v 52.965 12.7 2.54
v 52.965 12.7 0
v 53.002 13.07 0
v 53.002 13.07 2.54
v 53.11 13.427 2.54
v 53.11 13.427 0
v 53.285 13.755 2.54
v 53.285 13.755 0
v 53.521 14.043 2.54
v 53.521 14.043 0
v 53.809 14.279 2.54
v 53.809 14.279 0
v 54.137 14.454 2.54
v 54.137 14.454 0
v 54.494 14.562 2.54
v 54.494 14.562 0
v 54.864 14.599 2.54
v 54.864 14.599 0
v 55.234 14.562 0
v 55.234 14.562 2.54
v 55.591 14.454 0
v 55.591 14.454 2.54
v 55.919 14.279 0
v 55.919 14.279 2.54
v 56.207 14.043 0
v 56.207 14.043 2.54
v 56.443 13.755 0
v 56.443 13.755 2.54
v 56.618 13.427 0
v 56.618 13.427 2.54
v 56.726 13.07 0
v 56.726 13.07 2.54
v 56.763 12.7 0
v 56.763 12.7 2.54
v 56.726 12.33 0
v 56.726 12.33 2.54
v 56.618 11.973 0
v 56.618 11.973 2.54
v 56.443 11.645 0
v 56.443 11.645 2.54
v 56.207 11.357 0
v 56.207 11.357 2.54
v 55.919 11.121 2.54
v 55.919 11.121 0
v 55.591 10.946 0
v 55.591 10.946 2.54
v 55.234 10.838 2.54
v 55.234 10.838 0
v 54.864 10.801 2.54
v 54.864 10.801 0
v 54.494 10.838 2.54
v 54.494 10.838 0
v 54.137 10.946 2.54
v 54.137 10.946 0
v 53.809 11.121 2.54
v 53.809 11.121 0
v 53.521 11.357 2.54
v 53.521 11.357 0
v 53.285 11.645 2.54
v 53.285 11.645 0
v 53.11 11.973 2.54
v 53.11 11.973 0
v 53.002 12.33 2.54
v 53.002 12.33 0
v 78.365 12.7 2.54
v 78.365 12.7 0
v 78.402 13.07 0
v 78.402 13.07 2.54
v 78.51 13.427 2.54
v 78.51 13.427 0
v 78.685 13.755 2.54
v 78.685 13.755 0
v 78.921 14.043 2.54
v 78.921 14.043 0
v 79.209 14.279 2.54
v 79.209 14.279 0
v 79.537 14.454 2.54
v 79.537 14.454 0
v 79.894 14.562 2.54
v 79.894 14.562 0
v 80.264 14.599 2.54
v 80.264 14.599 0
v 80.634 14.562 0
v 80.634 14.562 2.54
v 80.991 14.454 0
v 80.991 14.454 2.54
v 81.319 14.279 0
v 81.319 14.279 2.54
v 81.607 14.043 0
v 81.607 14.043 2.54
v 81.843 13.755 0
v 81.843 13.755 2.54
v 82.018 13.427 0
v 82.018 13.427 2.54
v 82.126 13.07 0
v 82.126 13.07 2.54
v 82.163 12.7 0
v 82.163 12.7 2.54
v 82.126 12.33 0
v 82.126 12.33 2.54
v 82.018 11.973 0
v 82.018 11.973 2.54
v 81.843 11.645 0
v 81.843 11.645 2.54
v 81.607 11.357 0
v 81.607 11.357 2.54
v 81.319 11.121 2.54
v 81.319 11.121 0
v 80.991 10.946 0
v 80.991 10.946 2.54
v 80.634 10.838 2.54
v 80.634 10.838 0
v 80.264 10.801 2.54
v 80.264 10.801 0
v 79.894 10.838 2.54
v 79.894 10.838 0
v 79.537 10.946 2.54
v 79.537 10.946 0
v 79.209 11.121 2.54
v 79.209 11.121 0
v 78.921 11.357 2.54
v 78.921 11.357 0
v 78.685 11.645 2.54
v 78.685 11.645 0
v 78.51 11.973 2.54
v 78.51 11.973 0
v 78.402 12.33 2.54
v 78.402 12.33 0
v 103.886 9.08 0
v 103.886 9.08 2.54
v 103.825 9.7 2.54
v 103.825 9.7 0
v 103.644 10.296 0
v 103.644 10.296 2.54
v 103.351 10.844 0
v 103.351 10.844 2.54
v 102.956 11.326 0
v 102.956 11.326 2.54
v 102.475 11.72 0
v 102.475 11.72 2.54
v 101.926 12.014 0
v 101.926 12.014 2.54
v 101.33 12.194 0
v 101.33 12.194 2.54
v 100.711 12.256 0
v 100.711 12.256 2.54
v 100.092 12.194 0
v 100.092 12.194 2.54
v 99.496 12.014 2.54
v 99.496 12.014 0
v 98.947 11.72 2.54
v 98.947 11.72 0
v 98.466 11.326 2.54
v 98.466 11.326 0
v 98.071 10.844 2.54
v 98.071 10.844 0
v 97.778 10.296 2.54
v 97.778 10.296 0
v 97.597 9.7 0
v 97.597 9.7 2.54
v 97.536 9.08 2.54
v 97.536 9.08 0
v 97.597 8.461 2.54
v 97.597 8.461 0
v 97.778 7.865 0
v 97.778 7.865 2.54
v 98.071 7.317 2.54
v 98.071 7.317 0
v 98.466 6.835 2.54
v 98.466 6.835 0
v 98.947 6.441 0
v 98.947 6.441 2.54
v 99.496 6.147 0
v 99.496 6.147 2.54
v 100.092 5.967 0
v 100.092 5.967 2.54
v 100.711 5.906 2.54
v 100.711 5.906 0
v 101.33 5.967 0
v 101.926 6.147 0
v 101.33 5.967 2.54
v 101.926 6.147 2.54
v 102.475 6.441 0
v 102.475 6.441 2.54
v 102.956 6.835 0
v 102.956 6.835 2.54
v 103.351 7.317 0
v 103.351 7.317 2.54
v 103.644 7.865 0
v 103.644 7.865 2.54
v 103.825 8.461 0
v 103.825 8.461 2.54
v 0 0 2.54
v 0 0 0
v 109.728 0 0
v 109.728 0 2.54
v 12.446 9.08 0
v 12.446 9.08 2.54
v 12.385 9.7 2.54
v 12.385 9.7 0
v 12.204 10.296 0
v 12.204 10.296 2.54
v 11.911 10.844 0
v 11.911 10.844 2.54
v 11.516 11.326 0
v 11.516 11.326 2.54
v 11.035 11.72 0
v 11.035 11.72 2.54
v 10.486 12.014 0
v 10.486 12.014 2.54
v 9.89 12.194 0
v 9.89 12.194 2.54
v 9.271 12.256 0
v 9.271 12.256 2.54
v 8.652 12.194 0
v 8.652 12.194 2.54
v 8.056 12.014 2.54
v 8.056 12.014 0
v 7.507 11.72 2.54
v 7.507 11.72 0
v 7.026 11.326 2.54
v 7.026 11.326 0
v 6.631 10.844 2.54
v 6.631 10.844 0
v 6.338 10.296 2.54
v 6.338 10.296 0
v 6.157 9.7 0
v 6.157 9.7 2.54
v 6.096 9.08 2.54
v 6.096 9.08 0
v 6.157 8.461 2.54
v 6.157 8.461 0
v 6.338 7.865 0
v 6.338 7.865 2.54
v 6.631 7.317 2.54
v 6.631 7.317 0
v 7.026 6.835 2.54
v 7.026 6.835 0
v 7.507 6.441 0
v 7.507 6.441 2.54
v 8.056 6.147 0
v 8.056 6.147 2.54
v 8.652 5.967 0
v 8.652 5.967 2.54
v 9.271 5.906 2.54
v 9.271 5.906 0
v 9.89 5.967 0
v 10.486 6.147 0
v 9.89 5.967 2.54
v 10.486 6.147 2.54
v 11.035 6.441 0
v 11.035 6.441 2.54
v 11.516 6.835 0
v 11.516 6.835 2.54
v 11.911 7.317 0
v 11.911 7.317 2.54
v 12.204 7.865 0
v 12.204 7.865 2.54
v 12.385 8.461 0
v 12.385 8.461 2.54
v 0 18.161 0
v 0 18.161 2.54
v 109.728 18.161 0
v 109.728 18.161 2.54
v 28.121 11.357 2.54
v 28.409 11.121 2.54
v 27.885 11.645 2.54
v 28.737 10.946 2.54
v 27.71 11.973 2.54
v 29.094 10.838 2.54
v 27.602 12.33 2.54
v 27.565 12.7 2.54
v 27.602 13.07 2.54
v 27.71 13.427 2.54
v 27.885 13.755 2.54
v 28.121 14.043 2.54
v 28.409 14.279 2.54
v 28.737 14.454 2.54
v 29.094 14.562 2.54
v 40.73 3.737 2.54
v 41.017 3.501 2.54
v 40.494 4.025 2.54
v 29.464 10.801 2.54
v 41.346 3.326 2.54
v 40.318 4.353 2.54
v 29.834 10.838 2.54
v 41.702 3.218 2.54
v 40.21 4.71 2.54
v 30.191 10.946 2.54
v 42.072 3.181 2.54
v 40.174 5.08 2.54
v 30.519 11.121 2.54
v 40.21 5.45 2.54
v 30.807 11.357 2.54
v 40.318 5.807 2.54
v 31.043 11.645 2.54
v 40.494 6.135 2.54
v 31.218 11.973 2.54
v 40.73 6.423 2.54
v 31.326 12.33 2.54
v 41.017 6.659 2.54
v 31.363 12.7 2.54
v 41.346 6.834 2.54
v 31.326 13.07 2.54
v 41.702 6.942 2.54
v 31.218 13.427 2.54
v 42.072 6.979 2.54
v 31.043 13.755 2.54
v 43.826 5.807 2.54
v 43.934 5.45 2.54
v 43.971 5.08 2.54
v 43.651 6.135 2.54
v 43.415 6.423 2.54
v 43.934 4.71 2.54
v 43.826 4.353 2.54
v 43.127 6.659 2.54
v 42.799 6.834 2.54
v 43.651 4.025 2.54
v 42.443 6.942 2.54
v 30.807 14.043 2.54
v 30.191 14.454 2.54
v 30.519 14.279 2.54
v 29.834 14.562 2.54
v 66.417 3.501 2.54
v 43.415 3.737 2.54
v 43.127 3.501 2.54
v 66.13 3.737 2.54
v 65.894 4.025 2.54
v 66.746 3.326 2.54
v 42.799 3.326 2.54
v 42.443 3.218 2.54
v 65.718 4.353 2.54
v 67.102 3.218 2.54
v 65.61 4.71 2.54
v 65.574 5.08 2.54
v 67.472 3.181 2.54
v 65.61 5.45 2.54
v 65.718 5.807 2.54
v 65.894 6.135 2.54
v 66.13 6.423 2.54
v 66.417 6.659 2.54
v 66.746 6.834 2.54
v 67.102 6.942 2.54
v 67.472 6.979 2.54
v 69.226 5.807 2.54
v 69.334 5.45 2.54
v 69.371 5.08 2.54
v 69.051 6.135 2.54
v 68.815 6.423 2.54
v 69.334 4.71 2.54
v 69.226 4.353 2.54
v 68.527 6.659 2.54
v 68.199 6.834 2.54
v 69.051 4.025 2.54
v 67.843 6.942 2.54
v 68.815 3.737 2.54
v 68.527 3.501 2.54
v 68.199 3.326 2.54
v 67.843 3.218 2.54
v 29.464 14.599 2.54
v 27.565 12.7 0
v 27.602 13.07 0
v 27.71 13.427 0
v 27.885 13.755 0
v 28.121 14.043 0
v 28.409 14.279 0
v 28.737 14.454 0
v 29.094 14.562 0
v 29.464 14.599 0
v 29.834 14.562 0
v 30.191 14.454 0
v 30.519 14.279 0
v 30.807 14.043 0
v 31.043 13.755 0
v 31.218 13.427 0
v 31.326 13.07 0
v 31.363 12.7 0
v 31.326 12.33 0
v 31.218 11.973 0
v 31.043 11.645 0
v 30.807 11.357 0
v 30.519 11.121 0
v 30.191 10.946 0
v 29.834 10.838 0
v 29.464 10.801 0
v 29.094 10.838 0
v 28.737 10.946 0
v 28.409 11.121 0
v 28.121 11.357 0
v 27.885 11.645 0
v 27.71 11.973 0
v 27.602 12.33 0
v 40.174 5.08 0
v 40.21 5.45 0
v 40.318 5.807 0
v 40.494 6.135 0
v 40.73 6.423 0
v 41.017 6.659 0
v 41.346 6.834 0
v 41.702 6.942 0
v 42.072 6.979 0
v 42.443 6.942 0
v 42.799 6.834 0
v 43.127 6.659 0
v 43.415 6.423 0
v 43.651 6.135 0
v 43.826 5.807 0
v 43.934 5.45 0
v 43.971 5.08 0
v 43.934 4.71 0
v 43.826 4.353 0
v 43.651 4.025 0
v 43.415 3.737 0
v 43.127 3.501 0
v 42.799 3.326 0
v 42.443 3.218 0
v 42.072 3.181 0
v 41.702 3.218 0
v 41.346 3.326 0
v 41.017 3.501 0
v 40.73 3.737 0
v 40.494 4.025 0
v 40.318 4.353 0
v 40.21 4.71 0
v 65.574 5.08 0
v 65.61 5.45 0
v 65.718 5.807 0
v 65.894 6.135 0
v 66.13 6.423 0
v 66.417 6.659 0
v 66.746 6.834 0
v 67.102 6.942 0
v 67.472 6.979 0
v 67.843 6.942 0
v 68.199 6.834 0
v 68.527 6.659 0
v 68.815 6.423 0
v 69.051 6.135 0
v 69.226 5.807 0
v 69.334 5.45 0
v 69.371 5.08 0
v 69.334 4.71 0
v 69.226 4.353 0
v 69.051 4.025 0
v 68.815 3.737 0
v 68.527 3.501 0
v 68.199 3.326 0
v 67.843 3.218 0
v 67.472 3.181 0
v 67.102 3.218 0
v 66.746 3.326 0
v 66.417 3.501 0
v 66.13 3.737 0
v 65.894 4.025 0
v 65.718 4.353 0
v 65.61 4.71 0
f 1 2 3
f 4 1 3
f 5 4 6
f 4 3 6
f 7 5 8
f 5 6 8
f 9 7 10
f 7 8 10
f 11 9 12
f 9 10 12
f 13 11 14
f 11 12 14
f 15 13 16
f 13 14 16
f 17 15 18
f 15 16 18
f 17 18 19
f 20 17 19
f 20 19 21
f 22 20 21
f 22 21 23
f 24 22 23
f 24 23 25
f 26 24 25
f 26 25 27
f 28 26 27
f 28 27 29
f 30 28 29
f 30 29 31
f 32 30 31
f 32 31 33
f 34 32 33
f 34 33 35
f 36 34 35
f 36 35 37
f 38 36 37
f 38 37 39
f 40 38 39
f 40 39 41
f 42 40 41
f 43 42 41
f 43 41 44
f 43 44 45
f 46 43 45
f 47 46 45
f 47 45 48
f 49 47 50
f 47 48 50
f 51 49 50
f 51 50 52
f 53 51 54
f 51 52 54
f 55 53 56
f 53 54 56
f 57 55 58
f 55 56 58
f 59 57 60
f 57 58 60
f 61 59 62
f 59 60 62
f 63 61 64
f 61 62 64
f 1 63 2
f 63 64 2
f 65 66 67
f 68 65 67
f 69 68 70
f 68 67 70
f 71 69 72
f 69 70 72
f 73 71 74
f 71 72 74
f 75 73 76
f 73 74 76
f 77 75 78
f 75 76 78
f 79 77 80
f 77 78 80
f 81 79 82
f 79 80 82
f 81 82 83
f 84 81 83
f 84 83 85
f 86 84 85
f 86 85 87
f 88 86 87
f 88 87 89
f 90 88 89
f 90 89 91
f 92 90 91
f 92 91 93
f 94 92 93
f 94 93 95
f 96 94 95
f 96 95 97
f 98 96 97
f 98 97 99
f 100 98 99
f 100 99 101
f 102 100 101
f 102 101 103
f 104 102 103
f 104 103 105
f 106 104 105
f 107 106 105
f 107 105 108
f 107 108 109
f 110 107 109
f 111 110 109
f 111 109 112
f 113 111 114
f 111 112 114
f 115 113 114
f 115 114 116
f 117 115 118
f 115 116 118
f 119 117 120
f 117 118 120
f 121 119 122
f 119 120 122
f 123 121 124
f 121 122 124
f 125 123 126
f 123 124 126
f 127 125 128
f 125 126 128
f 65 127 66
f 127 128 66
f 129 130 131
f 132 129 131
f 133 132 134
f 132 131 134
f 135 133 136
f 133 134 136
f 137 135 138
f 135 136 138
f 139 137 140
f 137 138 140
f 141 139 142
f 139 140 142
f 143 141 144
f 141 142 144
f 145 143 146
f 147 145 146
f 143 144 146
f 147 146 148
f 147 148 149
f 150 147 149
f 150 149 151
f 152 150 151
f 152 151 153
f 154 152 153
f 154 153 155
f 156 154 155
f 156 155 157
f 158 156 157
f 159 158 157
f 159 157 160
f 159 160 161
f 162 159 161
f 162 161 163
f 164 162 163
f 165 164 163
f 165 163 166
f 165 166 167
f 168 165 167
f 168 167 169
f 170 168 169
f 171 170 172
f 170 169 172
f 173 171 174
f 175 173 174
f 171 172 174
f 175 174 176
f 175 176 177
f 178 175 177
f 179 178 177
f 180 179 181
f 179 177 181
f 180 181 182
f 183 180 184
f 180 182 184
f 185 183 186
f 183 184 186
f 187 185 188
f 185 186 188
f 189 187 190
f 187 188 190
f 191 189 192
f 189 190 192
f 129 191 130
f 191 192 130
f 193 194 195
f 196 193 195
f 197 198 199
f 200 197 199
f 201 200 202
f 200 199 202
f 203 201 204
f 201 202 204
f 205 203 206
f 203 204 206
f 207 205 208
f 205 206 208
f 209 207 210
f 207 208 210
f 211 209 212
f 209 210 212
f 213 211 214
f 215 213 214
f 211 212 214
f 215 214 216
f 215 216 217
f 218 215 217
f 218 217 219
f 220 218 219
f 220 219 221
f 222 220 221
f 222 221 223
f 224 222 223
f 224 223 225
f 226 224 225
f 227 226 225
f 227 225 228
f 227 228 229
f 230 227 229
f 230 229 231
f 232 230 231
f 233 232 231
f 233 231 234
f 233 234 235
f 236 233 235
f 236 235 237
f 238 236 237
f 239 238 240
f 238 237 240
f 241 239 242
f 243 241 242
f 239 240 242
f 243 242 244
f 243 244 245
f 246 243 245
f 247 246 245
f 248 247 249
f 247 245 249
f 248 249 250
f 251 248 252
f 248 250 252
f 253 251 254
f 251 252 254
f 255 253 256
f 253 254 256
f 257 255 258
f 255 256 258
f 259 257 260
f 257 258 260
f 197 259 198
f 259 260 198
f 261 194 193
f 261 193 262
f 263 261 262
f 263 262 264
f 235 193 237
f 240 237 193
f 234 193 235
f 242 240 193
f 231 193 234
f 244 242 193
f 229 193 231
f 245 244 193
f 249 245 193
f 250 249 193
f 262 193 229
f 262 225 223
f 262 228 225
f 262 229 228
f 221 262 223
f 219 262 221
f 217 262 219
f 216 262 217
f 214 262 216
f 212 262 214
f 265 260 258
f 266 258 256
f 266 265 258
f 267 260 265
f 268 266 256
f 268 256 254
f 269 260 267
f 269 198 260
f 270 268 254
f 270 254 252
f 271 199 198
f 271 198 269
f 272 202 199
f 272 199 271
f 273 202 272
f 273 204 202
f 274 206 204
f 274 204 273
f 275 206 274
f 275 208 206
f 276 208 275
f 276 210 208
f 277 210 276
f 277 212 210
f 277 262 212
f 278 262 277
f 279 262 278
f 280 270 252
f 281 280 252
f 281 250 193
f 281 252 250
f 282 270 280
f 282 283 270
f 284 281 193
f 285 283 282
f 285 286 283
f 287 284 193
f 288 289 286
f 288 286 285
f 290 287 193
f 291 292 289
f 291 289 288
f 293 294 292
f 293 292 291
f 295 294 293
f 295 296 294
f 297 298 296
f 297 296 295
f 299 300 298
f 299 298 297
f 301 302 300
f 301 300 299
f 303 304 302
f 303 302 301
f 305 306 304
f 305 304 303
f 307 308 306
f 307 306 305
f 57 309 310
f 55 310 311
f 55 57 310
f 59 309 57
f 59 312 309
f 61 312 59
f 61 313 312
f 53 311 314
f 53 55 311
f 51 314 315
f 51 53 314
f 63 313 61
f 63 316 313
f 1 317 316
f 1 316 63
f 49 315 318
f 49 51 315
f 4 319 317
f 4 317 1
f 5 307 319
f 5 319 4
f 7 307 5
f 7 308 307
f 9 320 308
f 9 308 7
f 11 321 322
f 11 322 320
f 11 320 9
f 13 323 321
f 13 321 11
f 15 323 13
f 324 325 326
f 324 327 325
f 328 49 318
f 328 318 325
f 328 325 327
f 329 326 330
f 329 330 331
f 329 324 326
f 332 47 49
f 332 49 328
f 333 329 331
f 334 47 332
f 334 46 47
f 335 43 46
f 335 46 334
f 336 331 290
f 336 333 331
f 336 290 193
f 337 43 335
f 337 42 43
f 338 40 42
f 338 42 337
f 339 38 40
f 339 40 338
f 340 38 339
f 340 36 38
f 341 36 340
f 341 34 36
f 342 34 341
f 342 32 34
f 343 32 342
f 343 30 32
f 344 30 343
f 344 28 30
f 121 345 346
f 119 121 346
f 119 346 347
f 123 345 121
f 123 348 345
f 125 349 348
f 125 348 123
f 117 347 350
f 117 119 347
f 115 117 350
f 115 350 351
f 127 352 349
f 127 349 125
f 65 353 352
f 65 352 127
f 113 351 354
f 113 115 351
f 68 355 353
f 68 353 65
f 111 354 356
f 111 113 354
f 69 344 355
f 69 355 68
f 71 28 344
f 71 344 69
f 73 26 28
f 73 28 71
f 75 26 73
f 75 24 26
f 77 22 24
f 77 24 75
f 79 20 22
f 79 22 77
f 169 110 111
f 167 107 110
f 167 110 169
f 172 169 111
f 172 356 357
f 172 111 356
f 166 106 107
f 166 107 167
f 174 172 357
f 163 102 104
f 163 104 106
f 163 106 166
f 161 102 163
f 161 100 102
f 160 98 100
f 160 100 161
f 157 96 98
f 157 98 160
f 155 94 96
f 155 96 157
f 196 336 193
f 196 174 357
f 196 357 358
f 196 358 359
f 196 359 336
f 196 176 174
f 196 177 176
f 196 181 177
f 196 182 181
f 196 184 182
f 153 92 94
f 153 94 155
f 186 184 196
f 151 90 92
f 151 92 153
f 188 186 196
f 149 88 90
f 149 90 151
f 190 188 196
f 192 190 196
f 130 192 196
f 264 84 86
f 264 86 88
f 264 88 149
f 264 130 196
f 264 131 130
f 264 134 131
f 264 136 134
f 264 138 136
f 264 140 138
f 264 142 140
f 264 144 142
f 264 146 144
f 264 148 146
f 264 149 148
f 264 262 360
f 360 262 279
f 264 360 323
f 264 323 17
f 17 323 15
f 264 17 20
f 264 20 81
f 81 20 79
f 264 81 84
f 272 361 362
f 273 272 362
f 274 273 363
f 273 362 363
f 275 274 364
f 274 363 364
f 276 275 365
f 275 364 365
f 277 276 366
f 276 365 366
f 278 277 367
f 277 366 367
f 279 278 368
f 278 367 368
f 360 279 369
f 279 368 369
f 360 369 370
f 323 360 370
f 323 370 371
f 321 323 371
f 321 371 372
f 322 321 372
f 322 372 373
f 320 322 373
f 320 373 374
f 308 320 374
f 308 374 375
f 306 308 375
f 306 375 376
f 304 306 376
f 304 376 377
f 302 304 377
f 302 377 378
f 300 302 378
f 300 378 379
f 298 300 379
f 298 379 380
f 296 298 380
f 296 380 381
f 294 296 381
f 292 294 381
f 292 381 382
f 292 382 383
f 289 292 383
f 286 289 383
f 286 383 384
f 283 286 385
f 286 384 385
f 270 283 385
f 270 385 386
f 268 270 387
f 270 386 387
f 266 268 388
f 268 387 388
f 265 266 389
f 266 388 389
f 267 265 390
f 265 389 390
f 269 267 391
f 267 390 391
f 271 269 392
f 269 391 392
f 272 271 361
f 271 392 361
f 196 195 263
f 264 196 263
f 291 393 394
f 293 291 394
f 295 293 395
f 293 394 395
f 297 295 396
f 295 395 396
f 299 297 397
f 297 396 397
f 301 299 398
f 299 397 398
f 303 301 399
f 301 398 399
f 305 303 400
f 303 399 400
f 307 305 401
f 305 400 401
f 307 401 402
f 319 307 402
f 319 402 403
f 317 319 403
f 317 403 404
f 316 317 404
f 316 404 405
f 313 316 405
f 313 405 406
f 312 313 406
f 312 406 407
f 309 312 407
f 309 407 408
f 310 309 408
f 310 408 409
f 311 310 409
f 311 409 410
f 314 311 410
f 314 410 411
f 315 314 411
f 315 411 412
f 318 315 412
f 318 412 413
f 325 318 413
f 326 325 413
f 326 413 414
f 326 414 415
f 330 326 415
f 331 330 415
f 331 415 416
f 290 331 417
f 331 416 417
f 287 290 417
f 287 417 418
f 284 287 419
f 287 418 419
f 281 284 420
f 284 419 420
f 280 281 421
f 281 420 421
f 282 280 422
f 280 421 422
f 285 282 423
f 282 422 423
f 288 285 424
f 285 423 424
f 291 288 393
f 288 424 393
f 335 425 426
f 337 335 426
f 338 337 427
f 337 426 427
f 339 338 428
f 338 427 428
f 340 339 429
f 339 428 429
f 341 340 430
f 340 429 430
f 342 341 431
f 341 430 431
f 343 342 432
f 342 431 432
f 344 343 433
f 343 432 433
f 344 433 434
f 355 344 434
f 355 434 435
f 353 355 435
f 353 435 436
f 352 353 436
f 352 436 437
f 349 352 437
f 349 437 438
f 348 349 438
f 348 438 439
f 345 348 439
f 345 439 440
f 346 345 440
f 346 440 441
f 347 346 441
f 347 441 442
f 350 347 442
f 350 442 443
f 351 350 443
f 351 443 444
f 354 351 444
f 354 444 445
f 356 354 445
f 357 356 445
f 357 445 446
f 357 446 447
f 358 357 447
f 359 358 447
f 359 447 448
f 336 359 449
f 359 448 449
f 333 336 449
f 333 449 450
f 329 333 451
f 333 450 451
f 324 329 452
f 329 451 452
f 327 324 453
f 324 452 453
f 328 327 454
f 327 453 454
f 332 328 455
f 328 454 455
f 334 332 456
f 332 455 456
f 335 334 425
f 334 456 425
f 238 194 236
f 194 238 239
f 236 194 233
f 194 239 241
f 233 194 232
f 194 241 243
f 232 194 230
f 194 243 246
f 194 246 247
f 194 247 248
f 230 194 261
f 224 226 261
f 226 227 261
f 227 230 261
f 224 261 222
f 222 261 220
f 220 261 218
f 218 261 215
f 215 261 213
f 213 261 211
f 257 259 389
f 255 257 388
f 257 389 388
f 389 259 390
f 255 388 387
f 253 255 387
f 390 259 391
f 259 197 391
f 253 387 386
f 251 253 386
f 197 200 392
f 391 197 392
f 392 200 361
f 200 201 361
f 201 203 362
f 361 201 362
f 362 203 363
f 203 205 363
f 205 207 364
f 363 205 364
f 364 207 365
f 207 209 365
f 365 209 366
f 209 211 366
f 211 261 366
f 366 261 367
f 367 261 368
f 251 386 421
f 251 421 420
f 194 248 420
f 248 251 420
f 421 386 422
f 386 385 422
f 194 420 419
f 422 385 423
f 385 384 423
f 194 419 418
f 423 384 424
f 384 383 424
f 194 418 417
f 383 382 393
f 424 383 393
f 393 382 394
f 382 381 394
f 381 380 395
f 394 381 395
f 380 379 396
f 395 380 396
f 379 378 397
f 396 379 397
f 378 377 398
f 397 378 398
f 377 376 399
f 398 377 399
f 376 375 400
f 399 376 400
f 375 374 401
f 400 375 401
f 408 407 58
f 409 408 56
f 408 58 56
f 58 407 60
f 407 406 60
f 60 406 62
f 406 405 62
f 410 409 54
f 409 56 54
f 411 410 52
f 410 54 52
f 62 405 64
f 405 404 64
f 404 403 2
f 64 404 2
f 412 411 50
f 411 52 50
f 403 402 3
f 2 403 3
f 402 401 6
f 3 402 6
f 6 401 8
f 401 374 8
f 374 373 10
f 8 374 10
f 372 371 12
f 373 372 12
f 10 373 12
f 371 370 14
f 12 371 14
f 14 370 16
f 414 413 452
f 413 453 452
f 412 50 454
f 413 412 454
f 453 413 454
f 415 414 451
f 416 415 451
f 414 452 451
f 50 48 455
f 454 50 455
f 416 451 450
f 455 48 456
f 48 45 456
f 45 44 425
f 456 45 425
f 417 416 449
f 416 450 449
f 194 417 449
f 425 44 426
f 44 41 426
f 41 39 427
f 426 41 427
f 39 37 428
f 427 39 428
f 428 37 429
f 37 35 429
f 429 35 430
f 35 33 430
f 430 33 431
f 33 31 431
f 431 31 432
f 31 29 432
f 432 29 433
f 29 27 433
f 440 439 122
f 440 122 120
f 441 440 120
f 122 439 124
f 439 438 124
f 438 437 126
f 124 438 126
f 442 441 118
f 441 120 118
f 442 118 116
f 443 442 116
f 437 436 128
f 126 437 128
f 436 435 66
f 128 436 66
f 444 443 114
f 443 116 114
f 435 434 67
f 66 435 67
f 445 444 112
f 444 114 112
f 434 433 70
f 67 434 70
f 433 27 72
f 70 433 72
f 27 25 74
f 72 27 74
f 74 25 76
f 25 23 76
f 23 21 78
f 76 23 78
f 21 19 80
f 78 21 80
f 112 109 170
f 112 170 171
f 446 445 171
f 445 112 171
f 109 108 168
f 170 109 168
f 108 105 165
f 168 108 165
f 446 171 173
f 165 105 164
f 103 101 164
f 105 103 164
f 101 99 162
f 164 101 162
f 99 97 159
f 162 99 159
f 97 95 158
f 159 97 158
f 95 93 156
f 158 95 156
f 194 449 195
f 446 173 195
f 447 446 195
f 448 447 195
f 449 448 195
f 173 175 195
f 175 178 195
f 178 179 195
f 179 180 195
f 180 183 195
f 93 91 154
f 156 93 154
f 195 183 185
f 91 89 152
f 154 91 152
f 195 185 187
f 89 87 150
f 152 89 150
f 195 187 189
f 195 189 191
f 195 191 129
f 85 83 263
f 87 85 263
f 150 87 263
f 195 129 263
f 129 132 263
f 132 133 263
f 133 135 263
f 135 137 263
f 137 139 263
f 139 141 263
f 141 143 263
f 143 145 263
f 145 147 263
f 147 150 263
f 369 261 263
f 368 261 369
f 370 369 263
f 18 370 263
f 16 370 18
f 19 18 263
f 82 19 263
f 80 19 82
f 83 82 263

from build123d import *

# Parameters (mm, degrees)
F0_W     = 109.728
F0_H     = 18.161
F1_DEPTH = 2.54
F2_R     = 3.175
F3_DEPTH = 2.541
F5_D     = 3.7973


with BuildPart() as f1:
    # F0 (on Top) → F1 (new body)
    with BuildSketch(Plane.XY):
        with Locations((54.864, 9.0805)):
            Rectangle(F0_W, F0_H)
    extrude(amount=F1_DEPTH)

    # F2 (on face) → F3 (cut, through all)
    with BuildSketch(Plane.XY.offset(2.54)):
        with Locations((9.271, 9.0805)):
            Circle(F2_R)
        with Locations((100.711, 9.0805)):
            Circle(F2_R)
    extrude(amount=-F3_DEPTH, mode=Mode.SUBTRACT)

    # F5 (through all)
    with Locations(Plane.XY.offset(2.54)):
        with Locations((29.464, 12.7), (42.0722284243, 5.08), (54.864, 12.7), (67.4722284243, 5.08), (80.264, 12.7)):
            Hole(F5_D / 2)


solid = f1.part
